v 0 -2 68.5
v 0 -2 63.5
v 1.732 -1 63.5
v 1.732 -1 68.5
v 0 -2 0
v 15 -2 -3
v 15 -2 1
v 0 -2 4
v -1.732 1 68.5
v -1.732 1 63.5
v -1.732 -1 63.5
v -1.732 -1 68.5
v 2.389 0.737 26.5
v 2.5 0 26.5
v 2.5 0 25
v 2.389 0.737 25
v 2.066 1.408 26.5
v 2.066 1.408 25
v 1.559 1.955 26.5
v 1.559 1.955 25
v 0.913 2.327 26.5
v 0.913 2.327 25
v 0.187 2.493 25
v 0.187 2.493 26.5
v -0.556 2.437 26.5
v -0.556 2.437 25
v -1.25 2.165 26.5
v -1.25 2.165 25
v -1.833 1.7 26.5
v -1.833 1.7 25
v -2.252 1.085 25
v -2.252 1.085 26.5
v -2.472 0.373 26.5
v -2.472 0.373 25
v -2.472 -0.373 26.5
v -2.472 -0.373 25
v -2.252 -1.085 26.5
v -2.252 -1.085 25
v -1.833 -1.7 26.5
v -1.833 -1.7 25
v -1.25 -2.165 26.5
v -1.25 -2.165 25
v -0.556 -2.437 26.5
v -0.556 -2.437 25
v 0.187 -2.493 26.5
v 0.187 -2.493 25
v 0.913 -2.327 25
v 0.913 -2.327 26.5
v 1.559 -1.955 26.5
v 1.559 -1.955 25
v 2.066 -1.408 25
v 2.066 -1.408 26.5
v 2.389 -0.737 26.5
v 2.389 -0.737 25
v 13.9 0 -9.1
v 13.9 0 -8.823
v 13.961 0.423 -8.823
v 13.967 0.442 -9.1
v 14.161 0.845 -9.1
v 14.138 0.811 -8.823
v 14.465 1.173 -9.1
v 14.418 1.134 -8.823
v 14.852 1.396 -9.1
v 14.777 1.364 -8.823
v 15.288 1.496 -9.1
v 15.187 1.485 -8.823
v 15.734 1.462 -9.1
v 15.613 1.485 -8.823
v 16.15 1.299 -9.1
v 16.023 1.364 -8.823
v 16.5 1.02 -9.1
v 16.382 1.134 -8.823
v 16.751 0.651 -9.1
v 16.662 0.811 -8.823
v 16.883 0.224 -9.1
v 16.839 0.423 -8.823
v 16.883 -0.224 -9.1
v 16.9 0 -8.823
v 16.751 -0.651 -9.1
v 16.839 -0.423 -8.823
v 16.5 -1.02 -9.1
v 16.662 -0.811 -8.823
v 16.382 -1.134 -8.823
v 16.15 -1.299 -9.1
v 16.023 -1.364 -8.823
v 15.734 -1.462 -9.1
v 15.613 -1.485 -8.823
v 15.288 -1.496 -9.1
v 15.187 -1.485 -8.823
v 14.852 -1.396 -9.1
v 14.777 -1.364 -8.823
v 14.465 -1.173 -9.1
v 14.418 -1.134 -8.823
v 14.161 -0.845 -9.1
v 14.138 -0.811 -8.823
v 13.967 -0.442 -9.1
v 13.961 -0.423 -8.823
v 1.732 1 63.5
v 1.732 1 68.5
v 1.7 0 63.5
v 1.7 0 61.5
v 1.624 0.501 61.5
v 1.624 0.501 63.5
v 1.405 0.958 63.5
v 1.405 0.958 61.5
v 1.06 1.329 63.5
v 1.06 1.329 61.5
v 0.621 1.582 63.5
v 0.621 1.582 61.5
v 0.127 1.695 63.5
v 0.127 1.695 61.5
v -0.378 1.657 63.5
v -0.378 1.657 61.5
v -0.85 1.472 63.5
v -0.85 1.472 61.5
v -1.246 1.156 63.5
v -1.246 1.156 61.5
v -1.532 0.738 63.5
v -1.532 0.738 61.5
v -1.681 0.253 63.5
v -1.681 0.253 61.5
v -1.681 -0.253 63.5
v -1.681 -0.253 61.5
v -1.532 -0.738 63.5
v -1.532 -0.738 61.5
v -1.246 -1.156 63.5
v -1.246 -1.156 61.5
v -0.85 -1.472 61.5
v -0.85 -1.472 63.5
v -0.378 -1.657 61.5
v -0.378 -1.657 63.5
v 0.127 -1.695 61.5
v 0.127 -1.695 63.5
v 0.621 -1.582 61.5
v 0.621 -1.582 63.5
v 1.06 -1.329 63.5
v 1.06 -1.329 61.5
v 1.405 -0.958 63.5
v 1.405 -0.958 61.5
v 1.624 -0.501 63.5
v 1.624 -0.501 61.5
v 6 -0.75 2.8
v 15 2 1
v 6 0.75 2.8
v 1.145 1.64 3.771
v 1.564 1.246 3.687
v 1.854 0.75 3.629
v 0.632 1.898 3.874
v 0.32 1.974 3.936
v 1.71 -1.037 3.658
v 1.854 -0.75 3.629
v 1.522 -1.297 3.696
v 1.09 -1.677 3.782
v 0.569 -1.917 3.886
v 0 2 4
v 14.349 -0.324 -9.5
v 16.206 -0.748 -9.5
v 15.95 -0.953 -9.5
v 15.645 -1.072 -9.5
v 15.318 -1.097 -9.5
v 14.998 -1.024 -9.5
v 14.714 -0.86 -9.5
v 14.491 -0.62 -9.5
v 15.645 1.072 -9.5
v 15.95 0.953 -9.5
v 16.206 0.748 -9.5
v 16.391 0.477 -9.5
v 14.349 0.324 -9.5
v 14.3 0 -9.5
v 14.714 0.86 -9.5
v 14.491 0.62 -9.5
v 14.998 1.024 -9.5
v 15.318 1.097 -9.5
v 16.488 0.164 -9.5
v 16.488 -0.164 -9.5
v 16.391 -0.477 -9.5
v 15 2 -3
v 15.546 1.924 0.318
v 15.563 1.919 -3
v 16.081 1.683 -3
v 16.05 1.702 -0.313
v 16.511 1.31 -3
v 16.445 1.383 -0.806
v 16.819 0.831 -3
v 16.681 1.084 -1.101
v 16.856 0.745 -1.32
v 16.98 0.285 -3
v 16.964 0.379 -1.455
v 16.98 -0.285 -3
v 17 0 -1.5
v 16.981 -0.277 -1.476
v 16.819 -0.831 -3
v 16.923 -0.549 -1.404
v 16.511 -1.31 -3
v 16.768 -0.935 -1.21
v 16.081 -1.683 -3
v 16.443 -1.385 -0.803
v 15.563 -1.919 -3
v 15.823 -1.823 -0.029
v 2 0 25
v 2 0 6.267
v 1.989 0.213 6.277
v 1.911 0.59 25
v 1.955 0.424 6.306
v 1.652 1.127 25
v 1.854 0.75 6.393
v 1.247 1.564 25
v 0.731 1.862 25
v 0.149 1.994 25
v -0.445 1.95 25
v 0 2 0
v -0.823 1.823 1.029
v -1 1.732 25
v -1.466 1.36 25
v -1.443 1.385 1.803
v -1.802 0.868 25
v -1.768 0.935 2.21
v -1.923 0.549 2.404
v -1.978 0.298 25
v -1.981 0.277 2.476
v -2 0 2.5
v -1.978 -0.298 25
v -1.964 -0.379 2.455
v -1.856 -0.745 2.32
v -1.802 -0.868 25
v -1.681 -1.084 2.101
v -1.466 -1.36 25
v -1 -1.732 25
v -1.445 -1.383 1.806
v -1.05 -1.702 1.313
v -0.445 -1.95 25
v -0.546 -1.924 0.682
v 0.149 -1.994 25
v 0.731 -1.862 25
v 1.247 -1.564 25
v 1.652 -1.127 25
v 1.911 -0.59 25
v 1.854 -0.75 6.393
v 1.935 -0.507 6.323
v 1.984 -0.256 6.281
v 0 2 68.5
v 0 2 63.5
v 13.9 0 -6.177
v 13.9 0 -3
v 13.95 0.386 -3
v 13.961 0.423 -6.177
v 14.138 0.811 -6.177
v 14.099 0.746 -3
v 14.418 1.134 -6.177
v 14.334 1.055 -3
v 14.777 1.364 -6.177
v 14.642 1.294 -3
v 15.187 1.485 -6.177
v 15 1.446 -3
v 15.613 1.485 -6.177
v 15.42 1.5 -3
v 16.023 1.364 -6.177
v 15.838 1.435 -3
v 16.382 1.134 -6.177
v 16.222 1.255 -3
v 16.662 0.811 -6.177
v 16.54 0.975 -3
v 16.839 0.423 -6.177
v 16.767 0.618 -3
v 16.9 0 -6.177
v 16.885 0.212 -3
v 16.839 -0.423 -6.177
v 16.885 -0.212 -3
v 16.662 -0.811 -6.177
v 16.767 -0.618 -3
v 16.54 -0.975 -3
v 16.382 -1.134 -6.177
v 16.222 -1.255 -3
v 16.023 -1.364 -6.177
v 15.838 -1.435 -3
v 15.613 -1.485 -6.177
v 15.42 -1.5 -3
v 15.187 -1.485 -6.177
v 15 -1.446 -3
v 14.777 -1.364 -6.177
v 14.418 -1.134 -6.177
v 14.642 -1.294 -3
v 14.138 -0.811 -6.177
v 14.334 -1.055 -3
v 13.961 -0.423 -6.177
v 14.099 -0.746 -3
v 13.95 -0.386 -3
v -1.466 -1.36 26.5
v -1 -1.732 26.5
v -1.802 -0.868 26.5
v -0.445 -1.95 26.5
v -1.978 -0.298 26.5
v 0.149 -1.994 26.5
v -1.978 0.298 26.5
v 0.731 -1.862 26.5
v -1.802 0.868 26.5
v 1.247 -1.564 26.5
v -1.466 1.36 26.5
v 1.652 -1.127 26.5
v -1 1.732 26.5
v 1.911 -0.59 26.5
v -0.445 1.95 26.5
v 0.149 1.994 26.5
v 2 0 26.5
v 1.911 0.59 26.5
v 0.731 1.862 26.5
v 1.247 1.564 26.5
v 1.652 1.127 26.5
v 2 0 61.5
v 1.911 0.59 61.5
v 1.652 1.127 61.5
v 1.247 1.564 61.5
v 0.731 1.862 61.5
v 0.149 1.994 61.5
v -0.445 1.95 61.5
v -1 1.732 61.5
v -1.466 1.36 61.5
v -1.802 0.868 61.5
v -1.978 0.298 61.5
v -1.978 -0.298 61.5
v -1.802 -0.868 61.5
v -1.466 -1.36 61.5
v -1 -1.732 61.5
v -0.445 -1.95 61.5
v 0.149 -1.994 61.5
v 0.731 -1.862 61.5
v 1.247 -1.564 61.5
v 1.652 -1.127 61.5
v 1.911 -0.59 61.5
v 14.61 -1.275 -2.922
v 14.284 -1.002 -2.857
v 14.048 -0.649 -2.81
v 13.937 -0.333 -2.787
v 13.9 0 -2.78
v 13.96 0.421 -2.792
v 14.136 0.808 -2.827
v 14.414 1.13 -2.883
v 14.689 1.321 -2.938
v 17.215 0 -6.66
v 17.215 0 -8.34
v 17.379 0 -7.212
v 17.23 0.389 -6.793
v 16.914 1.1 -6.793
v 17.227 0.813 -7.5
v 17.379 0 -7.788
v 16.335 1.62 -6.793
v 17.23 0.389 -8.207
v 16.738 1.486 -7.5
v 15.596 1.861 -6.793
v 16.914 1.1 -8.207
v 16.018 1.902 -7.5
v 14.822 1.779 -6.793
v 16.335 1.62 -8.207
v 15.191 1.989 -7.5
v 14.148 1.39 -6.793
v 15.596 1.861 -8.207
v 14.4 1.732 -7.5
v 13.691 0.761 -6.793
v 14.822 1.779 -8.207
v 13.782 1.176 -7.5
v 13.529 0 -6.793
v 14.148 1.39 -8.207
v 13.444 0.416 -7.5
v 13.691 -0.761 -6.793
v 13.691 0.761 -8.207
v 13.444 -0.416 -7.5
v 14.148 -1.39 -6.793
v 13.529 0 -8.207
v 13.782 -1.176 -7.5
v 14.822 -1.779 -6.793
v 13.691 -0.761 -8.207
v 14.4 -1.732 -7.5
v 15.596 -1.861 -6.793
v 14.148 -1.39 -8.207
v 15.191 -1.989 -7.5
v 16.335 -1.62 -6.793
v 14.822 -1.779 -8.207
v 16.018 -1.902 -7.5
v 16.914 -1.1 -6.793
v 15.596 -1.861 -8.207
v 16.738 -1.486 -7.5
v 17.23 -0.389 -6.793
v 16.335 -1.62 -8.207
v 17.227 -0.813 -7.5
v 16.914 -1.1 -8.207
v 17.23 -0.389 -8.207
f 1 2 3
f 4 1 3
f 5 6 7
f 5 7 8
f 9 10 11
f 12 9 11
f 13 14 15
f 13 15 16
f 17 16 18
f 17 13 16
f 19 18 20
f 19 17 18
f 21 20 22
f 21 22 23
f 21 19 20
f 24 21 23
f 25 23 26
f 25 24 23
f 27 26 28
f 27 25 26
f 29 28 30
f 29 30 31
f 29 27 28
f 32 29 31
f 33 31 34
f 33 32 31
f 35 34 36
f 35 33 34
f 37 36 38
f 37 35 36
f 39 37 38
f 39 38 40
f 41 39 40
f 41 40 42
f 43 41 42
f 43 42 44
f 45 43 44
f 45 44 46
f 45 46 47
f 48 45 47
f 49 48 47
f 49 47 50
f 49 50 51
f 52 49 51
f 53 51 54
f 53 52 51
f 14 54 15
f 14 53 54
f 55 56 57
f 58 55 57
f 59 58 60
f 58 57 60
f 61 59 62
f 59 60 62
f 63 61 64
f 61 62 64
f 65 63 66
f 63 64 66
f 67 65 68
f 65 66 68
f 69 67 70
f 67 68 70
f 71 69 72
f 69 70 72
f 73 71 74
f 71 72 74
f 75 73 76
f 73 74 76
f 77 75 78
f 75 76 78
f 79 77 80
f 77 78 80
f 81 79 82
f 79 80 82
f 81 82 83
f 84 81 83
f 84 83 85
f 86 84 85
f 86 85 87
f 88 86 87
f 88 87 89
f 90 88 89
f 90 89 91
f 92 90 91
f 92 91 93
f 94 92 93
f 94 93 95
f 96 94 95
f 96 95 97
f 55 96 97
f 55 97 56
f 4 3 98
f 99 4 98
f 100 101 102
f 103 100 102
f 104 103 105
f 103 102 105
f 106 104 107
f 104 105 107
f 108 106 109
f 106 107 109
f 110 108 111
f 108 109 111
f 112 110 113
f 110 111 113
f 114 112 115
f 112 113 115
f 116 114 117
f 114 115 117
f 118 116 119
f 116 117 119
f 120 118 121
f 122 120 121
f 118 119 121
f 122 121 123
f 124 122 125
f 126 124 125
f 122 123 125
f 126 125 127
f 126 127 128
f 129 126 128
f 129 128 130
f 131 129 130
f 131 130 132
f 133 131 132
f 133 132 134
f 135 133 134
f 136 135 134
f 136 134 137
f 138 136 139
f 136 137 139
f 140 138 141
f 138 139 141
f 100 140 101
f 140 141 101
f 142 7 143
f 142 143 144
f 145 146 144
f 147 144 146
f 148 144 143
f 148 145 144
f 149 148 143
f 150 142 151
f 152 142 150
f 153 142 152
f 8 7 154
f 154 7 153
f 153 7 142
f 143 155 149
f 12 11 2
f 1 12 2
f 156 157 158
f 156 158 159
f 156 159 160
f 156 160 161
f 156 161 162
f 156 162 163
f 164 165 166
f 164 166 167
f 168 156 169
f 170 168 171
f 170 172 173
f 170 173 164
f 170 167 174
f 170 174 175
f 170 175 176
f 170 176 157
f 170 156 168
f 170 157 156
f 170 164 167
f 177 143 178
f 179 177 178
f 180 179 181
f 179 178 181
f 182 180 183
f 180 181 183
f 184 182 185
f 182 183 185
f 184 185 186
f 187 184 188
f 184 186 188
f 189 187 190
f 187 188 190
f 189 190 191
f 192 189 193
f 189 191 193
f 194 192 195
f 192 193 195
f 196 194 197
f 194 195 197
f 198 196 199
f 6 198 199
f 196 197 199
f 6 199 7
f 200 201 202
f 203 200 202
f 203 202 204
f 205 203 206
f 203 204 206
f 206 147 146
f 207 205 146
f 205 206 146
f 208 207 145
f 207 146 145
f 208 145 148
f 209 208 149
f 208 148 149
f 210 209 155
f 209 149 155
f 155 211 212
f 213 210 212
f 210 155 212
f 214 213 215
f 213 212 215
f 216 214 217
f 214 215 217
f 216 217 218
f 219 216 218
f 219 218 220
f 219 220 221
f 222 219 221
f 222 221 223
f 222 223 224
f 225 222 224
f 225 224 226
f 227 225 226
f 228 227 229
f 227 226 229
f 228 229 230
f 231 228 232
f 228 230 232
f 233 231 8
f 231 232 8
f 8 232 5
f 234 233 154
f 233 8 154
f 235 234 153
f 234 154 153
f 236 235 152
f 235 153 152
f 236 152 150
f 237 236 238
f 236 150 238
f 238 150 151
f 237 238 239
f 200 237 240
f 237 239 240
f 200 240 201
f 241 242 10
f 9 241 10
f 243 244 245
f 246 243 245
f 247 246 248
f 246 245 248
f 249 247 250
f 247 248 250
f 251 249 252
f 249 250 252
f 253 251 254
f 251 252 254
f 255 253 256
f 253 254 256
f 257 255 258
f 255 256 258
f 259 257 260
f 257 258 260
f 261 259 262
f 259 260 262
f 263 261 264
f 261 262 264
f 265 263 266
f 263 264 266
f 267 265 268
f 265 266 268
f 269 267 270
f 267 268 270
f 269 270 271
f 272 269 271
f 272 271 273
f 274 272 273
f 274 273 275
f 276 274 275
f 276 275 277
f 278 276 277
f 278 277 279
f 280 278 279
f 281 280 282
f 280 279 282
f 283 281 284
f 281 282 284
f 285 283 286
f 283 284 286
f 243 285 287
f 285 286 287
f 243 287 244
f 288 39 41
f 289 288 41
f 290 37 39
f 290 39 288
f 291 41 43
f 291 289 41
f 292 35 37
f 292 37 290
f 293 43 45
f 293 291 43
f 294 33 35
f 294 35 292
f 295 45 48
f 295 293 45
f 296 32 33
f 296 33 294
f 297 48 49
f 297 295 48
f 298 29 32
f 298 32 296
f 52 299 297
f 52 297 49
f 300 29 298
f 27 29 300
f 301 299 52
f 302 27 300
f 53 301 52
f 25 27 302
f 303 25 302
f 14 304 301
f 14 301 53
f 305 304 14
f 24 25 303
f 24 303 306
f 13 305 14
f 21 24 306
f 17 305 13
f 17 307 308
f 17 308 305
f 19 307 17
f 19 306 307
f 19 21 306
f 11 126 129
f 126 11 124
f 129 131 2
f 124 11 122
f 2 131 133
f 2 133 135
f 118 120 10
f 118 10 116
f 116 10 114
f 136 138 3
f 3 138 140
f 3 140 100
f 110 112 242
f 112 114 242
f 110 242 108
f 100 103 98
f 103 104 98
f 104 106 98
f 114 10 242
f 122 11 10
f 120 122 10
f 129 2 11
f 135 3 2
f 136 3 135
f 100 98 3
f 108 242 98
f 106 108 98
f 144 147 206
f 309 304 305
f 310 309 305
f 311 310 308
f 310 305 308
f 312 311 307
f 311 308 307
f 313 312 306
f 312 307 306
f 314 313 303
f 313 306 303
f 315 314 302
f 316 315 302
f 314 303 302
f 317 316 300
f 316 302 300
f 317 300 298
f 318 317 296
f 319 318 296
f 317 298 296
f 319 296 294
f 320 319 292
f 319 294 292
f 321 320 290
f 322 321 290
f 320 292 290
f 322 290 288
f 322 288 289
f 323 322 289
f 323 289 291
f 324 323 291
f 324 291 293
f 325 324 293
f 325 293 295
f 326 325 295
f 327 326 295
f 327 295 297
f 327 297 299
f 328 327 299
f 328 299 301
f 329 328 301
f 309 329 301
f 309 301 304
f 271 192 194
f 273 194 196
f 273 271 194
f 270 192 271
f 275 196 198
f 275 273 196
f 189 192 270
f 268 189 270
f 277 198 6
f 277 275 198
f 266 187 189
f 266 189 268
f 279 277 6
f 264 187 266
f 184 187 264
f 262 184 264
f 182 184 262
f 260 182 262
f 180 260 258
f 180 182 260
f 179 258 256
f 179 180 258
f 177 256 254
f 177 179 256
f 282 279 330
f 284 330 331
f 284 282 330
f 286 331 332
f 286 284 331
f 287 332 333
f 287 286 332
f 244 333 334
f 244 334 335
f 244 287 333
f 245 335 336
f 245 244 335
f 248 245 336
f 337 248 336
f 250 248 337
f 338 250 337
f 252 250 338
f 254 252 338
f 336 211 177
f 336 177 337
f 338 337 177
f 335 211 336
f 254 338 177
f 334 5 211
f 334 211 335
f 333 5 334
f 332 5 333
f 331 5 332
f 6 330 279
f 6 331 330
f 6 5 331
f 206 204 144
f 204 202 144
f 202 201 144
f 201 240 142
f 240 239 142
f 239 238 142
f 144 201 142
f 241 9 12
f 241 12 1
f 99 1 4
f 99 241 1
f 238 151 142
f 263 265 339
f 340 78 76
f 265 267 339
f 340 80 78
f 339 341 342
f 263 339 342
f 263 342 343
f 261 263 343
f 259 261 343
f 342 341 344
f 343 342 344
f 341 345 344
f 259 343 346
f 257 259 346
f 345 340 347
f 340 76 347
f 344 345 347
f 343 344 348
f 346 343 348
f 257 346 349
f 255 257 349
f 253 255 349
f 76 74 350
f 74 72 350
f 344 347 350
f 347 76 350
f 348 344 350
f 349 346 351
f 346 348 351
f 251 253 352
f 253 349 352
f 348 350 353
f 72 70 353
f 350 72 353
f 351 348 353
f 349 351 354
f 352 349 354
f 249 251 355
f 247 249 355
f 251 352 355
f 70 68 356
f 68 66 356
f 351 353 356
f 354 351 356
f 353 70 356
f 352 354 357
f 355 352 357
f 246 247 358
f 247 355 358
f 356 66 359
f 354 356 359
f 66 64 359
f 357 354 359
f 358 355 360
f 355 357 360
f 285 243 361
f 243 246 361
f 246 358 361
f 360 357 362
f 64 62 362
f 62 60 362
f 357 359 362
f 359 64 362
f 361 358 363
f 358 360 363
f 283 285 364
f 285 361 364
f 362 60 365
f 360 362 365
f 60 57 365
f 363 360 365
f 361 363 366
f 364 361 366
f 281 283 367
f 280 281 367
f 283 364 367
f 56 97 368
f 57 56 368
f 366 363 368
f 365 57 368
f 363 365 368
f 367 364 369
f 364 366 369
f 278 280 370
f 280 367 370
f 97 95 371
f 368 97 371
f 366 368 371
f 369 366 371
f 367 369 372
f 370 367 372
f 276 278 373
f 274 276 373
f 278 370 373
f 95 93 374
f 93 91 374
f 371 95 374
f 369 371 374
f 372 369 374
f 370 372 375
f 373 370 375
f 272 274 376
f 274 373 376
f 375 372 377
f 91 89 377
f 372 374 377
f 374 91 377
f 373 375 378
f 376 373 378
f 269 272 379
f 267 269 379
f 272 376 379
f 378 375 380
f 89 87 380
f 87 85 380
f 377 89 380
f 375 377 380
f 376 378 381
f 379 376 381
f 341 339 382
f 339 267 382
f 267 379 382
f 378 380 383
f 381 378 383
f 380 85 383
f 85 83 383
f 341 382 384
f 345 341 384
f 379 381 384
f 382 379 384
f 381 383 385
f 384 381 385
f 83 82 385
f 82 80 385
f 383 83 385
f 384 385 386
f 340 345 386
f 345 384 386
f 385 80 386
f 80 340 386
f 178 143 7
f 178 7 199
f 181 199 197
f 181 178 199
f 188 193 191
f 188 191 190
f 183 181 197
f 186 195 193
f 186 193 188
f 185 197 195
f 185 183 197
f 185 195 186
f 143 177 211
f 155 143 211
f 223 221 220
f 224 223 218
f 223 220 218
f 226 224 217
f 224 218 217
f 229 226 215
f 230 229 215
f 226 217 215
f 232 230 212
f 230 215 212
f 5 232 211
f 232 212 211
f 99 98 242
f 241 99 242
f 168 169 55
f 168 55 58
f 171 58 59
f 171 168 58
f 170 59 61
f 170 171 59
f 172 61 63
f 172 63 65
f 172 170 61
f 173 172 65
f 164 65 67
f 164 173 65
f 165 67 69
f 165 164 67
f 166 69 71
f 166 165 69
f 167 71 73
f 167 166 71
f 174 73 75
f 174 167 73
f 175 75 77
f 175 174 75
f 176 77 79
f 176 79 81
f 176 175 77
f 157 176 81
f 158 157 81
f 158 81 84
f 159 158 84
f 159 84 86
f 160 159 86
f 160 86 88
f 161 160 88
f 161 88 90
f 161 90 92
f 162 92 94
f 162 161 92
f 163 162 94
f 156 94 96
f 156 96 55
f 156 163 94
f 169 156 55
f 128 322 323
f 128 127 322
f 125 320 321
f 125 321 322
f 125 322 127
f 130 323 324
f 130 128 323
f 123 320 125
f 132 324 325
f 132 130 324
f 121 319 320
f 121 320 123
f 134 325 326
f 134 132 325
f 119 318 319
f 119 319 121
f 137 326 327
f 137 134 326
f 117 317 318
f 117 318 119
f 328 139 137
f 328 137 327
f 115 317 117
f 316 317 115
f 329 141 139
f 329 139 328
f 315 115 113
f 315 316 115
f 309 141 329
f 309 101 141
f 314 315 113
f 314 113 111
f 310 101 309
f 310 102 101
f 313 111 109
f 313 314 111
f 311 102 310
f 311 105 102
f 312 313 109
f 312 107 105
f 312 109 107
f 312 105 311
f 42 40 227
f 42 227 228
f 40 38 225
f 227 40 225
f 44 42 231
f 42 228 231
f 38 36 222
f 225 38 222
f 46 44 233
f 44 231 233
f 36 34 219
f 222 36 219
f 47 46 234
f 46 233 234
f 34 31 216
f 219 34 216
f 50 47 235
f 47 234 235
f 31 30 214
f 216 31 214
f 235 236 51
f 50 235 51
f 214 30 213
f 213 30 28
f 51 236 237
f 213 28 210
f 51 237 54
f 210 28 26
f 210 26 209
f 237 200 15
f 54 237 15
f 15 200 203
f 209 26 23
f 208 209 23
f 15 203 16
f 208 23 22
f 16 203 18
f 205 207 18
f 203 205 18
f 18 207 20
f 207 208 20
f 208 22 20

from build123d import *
from build123d.topology import SkipClean

# Parameters (mm, degrees)
SKETCH_1_R                  = 2
EXTRUDE_1_DEPTH             = 61.5
EXTRUDE_START               = -35
SKETCH_2_R                  = 2.5
EXTRUDE_2_DEPTH             = 1.5
SKETCH_3_R                  = 1.7
EXTRUDE_3_DEPTH             = 2
EXTRUDE_4_DEPTH             = 5
SKETCH_5_R                  = 2
EXTRUDE_5_DEPTH             = 4
EXTRUDE_6_DEPTH             = 2
EXTRUDE_6_DEPTH_BACK        = 2
CUT_EXTRUDE_1_REACH         = 72.721
SKETCH_8_R                  = 1.5
EXTRUDE_7_DEPTH             = 6.5
EXTRUDE_7_DIRECTION_2_REACH = 75.536
CHAMFER_1_SIZE              = 0.4
EXTRUDE_8_DEPTH             = 0.75
EXTRUDE_8_DEPTH_BACK        = 0.75


with BuildPart() as part:
    # 草图1 → 凸台-拉伸1 (new body)
    with BuildSketch(Plane.XY):
        Circle(SKETCH_1_R)
    extrude(amount=EXTRUDE_1_DEPTH)

    # 草图2 → 凸台-拉伸2 (add)
    with BuildSketch(Plane.XY.offset(61.5).offset(EXTRUDE_START)):
        Circle(SKETCH_2_R)
    extrude(amount=-EXTRUDE_2_DEPTH)

    # 草图3 → 凸台-拉伸3 (add)
    with BuildSketch(Plane.XY.offset(61.5)):
        Circle(SKETCH_3_R)
    extrude(amount=EXTRUDE_3_DEPTH)

    # 草图4 → 凸台-拉伸4 (add)
    with BuildSketch(Plane.XY.offset(63.5)):
        Polygon((0, 2), (-1.732050808, 1), (-1.732050808, -1), (0, -2), (1.732050808, -1), (1.732050808, 1), align=None)
    extrude(amount=EXTRUDE_4_DEPTH)



with BuildPart() as body_2:
    # 草图5 → 凸台-拉伸5 (new body)
    with BuildSketch(Plane(origin=(0, 0, 1), x_dir=(-1, 0, 0), z_dir=(0, 0, -1))):
        with Locations((-15, 0)):
            Circle(SKETCH_5_R)
    extrude(amount=EXTRUDE_5_DEPTH)


with BuildPart() as part_1:
    add(part.part)

    add(body_2.part)  # 凸台-拉伸6 merges body 2
    # 草图6 → 凸台-拉伸6 (add, two sides: drawn at the far end of the back side and taken through both)
    with BuildSketch(Plane(origin=(0, 0, 0), x_dir=(1, 0, 0), z_dir=(0, 1, 0)).offset(-EXTRUDE_6_DEPTH_BACK)):
        Polygon((0, 0), (15, 3), (15, -1), (0, -4), align=None)
    extrude(amount=EXTRUDE_6_DEPTH + EXTRUDE_6_DEPTH_BACK)

    # 草图7 → 切除-拉伸1 (cut, up to next)
    with BuildSketch(Plane(origin=(0, 2, 0), x_dir=(1, 0, 0), z_dir=(0, 1, 0)), mode=Mode.PRIVATE) as cut_extrude_1_sk1:
        Polygon((0, 0), (-2, 0), (-2, -2.5), align=None)
    cut_extrude_1_tool1 = extrude(cut_extrude_1_sk1.sketch, amount=-CUT_EXTRUDE_1_REACH, mode=Mode.PRIVATE) & part_1.part
    # 草图7 → 切除-拉伸1 (cut, up to next)
    with BuildSketch(Plane(origin=(0, 2, 0), x_dir=(1, 0, 0), z_dir=(0, 1, 0)), mode=Mode.PRIVATE) as cut_extrude_1_sk2:
        Polygon((15, -1), (17, 1.5), (17, -1), align=None)
    cut_extrude_1_tool2 = extrude(cut_extrude_1_sk2.sketch, amount=-CUT_EXTRUDE_1_REACH, mode=Mode.PRIVATE) & part_1.part
    # 草图7 → 切除-拉伸1 (cut, up to next)
    with BuildSketch(Plane(origin=(0, 2, 0), x_dir=(1, 0, 0), z_dir=(0, 1, 0)), mode=Mode.PRIVATE) as cut_extrude_1_sk3:
        Polygon((15, 3), (13, 2.6), (13, 3), align=None)
    cut_extrude_1_tool3 = extrude(cut_extrude_1_sk3.sketch, amount=-CUT_EXTRUDE_1_REACH, mode=Mode.PRIVATE) & part_1.part
    add(cut_extrude_1_tool1.solids().sort_by_distance((-1.333333, 2, 0.833333))[0], mode=Mode.SUBTRACT)
    add(cut_extrude_1_tool2.solids().sort_by_distance((16.333333, 2, 0.166667))[0], mode=Mode.SUBTRACT)
    add(cut_extrude_1_tool3.solids().sort_by_distance((13.666667, 2, -2.866667))[0], mode=Mode.SUBTRACT)

    # 草图8 → 凸台-拉伸7 (add)
    with BuildSketch(Plane(origin=(0, 0, -3), x_dir=(-1, 0, 0), z_dir=(0, 0, -1))):
        with Locations((-15.4, 0)):
            Circle(SKETCH_8_R)
    extrude(amount=EXTRUDE_7_DEPTH)

    # 草图8 → 凸台-拉伸7 direction 2 (add, up to next)
    with BuildSketch(Plane(origin=(0, 0, -3), x_dir=(-1, 0, 0), z_dir=(0, 0, -1)), mode=Mode.PRIVATE) as extrude_7_direction_2_sk1:
        with Locations((-15.4, 0)):
            Circle(SKETCH_8_R)
    extrude_7_direction_2_tool1 = extrude(extrude_7_direction_2_sk1.sketch, amount=-EXTRUDE_7_DIRECTION_2_REACH, mode=Mode.PRIVATE) - part_1.part
    add(extrude_7_direction_2_tool1.solids().sort_by_distance((15.4, 0, -3))[0])

    # 草图9 → 旋转1 (revolve)
    with SkipClean():  # the faces are left unmerged after this step: merging them gives an invalid solid
        with BuildSketch(Plane(origin=(0, 0, 0), x_dir=(1, 0, 0), z_dir=(0, 1, 0))):
            with BuildLine():
                Line((15.4, 9.5), (15.4, 7.5))
                Line((15.4, 7.5), (15.4, 5.5))
                ThreePointArc((15.4, 5.5), (17.4, 7.5), (15.4, 9.5))
            make_face()
        revolve(axis=Axis((15.4, 0, -9.5), (0, 0, 1)))
    add(part_1.part.scale(1), mode=Mode.REPLACE)  # the faces are merged on a copy

    # 倒角1
    chamfer_1_edges = [part_1.edges().sort_by_distance(p)[0] for p in [
        (16.9, 0, -9.5),
    ]]
    chamfer(chamfer_1_edges, length=CHAMFER_1_SIZE)

    # 草图10 → 凸台-拉伸8 (add, two sides: drawn at the far end of the back side and taken through both)
    with SkipClean():  # the faces are left unmerged after this step: merging them gives an invalid solid
        with BuildSketch(Plane(origin=(0, 0, 0), x_dir=(1, 0, 0), z_dir=(0, 1, 0)).offset(-EXTRUDE_8_DEPTH_BACK)):
            Polygon((0, -2), (0, -8), (6, -2.8), (8, -1.066666667), align=None)
        extrude(amount=EXTRUDE_8_DEPTH + EXTRUDE_8_DEPTH_BACK)


solid = part_1.part
